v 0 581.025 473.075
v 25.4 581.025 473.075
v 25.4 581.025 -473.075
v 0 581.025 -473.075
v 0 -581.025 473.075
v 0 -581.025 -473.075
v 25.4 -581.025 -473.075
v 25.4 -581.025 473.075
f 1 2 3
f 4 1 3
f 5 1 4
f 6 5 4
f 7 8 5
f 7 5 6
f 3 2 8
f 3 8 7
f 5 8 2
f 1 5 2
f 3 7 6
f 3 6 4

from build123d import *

# Parameters (mm, degrees)
SKETCH2_W           = 819.15
SKETCH2_H           = 1035.05
BOSS_EXTRUDE1_DEPTH = 25.4
SKETCH3_W           = 895.35
SKETCH3_H           = 1111.25
SKETCH3_W_2         = 819.15
SKETCH3_H_2         = 1035.05
BOSS_EXTRUDE2_DEPTH = 25.4
SKETCH4_W           = 946.15
SKETCH4_H           = 1162.05
BOSS_EXTRUDE3_DEPTH = 25.4


with BuildPart() as part:
    # Sketch2 → Boss-Extrude1 (new body)
    with BuildSketch(Plane(origin=(0, 0, 0), x_dir=(0, 0, -1), z_dir=(1, 0, 0))):
        Rectangle(SKETCH2_W, SKETCH2_H)
    extrude(amount=BOSS_EXTRUDE1_DEPTH)

    # Sketch3 → Boss-Extrude2 (add)
    with BuildSketch(Plane(origin=(25.4, 0, 0), x_dir=(0, 0, -1), z_dir=(1, 0, 0))):
        Rectangle(SKETCH3_W, SKETCH3_H)
        Rectangle(SKETCH3_W_2, SKETCH3_H_2, mode=Mode.SUBTRACT)
    extrude(amount=-BOSS_EXTRUDE2_DEPTH)

    # Sketch4 → Boss-Extrude3 (add)
    with BuildSketch(Plane(origin=(25.4, 0, 0), x_dir=(0, 0, -1), z_dir=(1, 0, 0))):
        Rectangle(SKETCH4_W, SKETCH4_H)
    extrude(amount=-BOSS_EXTRUDE3_DEPTH)


solid = part.part
